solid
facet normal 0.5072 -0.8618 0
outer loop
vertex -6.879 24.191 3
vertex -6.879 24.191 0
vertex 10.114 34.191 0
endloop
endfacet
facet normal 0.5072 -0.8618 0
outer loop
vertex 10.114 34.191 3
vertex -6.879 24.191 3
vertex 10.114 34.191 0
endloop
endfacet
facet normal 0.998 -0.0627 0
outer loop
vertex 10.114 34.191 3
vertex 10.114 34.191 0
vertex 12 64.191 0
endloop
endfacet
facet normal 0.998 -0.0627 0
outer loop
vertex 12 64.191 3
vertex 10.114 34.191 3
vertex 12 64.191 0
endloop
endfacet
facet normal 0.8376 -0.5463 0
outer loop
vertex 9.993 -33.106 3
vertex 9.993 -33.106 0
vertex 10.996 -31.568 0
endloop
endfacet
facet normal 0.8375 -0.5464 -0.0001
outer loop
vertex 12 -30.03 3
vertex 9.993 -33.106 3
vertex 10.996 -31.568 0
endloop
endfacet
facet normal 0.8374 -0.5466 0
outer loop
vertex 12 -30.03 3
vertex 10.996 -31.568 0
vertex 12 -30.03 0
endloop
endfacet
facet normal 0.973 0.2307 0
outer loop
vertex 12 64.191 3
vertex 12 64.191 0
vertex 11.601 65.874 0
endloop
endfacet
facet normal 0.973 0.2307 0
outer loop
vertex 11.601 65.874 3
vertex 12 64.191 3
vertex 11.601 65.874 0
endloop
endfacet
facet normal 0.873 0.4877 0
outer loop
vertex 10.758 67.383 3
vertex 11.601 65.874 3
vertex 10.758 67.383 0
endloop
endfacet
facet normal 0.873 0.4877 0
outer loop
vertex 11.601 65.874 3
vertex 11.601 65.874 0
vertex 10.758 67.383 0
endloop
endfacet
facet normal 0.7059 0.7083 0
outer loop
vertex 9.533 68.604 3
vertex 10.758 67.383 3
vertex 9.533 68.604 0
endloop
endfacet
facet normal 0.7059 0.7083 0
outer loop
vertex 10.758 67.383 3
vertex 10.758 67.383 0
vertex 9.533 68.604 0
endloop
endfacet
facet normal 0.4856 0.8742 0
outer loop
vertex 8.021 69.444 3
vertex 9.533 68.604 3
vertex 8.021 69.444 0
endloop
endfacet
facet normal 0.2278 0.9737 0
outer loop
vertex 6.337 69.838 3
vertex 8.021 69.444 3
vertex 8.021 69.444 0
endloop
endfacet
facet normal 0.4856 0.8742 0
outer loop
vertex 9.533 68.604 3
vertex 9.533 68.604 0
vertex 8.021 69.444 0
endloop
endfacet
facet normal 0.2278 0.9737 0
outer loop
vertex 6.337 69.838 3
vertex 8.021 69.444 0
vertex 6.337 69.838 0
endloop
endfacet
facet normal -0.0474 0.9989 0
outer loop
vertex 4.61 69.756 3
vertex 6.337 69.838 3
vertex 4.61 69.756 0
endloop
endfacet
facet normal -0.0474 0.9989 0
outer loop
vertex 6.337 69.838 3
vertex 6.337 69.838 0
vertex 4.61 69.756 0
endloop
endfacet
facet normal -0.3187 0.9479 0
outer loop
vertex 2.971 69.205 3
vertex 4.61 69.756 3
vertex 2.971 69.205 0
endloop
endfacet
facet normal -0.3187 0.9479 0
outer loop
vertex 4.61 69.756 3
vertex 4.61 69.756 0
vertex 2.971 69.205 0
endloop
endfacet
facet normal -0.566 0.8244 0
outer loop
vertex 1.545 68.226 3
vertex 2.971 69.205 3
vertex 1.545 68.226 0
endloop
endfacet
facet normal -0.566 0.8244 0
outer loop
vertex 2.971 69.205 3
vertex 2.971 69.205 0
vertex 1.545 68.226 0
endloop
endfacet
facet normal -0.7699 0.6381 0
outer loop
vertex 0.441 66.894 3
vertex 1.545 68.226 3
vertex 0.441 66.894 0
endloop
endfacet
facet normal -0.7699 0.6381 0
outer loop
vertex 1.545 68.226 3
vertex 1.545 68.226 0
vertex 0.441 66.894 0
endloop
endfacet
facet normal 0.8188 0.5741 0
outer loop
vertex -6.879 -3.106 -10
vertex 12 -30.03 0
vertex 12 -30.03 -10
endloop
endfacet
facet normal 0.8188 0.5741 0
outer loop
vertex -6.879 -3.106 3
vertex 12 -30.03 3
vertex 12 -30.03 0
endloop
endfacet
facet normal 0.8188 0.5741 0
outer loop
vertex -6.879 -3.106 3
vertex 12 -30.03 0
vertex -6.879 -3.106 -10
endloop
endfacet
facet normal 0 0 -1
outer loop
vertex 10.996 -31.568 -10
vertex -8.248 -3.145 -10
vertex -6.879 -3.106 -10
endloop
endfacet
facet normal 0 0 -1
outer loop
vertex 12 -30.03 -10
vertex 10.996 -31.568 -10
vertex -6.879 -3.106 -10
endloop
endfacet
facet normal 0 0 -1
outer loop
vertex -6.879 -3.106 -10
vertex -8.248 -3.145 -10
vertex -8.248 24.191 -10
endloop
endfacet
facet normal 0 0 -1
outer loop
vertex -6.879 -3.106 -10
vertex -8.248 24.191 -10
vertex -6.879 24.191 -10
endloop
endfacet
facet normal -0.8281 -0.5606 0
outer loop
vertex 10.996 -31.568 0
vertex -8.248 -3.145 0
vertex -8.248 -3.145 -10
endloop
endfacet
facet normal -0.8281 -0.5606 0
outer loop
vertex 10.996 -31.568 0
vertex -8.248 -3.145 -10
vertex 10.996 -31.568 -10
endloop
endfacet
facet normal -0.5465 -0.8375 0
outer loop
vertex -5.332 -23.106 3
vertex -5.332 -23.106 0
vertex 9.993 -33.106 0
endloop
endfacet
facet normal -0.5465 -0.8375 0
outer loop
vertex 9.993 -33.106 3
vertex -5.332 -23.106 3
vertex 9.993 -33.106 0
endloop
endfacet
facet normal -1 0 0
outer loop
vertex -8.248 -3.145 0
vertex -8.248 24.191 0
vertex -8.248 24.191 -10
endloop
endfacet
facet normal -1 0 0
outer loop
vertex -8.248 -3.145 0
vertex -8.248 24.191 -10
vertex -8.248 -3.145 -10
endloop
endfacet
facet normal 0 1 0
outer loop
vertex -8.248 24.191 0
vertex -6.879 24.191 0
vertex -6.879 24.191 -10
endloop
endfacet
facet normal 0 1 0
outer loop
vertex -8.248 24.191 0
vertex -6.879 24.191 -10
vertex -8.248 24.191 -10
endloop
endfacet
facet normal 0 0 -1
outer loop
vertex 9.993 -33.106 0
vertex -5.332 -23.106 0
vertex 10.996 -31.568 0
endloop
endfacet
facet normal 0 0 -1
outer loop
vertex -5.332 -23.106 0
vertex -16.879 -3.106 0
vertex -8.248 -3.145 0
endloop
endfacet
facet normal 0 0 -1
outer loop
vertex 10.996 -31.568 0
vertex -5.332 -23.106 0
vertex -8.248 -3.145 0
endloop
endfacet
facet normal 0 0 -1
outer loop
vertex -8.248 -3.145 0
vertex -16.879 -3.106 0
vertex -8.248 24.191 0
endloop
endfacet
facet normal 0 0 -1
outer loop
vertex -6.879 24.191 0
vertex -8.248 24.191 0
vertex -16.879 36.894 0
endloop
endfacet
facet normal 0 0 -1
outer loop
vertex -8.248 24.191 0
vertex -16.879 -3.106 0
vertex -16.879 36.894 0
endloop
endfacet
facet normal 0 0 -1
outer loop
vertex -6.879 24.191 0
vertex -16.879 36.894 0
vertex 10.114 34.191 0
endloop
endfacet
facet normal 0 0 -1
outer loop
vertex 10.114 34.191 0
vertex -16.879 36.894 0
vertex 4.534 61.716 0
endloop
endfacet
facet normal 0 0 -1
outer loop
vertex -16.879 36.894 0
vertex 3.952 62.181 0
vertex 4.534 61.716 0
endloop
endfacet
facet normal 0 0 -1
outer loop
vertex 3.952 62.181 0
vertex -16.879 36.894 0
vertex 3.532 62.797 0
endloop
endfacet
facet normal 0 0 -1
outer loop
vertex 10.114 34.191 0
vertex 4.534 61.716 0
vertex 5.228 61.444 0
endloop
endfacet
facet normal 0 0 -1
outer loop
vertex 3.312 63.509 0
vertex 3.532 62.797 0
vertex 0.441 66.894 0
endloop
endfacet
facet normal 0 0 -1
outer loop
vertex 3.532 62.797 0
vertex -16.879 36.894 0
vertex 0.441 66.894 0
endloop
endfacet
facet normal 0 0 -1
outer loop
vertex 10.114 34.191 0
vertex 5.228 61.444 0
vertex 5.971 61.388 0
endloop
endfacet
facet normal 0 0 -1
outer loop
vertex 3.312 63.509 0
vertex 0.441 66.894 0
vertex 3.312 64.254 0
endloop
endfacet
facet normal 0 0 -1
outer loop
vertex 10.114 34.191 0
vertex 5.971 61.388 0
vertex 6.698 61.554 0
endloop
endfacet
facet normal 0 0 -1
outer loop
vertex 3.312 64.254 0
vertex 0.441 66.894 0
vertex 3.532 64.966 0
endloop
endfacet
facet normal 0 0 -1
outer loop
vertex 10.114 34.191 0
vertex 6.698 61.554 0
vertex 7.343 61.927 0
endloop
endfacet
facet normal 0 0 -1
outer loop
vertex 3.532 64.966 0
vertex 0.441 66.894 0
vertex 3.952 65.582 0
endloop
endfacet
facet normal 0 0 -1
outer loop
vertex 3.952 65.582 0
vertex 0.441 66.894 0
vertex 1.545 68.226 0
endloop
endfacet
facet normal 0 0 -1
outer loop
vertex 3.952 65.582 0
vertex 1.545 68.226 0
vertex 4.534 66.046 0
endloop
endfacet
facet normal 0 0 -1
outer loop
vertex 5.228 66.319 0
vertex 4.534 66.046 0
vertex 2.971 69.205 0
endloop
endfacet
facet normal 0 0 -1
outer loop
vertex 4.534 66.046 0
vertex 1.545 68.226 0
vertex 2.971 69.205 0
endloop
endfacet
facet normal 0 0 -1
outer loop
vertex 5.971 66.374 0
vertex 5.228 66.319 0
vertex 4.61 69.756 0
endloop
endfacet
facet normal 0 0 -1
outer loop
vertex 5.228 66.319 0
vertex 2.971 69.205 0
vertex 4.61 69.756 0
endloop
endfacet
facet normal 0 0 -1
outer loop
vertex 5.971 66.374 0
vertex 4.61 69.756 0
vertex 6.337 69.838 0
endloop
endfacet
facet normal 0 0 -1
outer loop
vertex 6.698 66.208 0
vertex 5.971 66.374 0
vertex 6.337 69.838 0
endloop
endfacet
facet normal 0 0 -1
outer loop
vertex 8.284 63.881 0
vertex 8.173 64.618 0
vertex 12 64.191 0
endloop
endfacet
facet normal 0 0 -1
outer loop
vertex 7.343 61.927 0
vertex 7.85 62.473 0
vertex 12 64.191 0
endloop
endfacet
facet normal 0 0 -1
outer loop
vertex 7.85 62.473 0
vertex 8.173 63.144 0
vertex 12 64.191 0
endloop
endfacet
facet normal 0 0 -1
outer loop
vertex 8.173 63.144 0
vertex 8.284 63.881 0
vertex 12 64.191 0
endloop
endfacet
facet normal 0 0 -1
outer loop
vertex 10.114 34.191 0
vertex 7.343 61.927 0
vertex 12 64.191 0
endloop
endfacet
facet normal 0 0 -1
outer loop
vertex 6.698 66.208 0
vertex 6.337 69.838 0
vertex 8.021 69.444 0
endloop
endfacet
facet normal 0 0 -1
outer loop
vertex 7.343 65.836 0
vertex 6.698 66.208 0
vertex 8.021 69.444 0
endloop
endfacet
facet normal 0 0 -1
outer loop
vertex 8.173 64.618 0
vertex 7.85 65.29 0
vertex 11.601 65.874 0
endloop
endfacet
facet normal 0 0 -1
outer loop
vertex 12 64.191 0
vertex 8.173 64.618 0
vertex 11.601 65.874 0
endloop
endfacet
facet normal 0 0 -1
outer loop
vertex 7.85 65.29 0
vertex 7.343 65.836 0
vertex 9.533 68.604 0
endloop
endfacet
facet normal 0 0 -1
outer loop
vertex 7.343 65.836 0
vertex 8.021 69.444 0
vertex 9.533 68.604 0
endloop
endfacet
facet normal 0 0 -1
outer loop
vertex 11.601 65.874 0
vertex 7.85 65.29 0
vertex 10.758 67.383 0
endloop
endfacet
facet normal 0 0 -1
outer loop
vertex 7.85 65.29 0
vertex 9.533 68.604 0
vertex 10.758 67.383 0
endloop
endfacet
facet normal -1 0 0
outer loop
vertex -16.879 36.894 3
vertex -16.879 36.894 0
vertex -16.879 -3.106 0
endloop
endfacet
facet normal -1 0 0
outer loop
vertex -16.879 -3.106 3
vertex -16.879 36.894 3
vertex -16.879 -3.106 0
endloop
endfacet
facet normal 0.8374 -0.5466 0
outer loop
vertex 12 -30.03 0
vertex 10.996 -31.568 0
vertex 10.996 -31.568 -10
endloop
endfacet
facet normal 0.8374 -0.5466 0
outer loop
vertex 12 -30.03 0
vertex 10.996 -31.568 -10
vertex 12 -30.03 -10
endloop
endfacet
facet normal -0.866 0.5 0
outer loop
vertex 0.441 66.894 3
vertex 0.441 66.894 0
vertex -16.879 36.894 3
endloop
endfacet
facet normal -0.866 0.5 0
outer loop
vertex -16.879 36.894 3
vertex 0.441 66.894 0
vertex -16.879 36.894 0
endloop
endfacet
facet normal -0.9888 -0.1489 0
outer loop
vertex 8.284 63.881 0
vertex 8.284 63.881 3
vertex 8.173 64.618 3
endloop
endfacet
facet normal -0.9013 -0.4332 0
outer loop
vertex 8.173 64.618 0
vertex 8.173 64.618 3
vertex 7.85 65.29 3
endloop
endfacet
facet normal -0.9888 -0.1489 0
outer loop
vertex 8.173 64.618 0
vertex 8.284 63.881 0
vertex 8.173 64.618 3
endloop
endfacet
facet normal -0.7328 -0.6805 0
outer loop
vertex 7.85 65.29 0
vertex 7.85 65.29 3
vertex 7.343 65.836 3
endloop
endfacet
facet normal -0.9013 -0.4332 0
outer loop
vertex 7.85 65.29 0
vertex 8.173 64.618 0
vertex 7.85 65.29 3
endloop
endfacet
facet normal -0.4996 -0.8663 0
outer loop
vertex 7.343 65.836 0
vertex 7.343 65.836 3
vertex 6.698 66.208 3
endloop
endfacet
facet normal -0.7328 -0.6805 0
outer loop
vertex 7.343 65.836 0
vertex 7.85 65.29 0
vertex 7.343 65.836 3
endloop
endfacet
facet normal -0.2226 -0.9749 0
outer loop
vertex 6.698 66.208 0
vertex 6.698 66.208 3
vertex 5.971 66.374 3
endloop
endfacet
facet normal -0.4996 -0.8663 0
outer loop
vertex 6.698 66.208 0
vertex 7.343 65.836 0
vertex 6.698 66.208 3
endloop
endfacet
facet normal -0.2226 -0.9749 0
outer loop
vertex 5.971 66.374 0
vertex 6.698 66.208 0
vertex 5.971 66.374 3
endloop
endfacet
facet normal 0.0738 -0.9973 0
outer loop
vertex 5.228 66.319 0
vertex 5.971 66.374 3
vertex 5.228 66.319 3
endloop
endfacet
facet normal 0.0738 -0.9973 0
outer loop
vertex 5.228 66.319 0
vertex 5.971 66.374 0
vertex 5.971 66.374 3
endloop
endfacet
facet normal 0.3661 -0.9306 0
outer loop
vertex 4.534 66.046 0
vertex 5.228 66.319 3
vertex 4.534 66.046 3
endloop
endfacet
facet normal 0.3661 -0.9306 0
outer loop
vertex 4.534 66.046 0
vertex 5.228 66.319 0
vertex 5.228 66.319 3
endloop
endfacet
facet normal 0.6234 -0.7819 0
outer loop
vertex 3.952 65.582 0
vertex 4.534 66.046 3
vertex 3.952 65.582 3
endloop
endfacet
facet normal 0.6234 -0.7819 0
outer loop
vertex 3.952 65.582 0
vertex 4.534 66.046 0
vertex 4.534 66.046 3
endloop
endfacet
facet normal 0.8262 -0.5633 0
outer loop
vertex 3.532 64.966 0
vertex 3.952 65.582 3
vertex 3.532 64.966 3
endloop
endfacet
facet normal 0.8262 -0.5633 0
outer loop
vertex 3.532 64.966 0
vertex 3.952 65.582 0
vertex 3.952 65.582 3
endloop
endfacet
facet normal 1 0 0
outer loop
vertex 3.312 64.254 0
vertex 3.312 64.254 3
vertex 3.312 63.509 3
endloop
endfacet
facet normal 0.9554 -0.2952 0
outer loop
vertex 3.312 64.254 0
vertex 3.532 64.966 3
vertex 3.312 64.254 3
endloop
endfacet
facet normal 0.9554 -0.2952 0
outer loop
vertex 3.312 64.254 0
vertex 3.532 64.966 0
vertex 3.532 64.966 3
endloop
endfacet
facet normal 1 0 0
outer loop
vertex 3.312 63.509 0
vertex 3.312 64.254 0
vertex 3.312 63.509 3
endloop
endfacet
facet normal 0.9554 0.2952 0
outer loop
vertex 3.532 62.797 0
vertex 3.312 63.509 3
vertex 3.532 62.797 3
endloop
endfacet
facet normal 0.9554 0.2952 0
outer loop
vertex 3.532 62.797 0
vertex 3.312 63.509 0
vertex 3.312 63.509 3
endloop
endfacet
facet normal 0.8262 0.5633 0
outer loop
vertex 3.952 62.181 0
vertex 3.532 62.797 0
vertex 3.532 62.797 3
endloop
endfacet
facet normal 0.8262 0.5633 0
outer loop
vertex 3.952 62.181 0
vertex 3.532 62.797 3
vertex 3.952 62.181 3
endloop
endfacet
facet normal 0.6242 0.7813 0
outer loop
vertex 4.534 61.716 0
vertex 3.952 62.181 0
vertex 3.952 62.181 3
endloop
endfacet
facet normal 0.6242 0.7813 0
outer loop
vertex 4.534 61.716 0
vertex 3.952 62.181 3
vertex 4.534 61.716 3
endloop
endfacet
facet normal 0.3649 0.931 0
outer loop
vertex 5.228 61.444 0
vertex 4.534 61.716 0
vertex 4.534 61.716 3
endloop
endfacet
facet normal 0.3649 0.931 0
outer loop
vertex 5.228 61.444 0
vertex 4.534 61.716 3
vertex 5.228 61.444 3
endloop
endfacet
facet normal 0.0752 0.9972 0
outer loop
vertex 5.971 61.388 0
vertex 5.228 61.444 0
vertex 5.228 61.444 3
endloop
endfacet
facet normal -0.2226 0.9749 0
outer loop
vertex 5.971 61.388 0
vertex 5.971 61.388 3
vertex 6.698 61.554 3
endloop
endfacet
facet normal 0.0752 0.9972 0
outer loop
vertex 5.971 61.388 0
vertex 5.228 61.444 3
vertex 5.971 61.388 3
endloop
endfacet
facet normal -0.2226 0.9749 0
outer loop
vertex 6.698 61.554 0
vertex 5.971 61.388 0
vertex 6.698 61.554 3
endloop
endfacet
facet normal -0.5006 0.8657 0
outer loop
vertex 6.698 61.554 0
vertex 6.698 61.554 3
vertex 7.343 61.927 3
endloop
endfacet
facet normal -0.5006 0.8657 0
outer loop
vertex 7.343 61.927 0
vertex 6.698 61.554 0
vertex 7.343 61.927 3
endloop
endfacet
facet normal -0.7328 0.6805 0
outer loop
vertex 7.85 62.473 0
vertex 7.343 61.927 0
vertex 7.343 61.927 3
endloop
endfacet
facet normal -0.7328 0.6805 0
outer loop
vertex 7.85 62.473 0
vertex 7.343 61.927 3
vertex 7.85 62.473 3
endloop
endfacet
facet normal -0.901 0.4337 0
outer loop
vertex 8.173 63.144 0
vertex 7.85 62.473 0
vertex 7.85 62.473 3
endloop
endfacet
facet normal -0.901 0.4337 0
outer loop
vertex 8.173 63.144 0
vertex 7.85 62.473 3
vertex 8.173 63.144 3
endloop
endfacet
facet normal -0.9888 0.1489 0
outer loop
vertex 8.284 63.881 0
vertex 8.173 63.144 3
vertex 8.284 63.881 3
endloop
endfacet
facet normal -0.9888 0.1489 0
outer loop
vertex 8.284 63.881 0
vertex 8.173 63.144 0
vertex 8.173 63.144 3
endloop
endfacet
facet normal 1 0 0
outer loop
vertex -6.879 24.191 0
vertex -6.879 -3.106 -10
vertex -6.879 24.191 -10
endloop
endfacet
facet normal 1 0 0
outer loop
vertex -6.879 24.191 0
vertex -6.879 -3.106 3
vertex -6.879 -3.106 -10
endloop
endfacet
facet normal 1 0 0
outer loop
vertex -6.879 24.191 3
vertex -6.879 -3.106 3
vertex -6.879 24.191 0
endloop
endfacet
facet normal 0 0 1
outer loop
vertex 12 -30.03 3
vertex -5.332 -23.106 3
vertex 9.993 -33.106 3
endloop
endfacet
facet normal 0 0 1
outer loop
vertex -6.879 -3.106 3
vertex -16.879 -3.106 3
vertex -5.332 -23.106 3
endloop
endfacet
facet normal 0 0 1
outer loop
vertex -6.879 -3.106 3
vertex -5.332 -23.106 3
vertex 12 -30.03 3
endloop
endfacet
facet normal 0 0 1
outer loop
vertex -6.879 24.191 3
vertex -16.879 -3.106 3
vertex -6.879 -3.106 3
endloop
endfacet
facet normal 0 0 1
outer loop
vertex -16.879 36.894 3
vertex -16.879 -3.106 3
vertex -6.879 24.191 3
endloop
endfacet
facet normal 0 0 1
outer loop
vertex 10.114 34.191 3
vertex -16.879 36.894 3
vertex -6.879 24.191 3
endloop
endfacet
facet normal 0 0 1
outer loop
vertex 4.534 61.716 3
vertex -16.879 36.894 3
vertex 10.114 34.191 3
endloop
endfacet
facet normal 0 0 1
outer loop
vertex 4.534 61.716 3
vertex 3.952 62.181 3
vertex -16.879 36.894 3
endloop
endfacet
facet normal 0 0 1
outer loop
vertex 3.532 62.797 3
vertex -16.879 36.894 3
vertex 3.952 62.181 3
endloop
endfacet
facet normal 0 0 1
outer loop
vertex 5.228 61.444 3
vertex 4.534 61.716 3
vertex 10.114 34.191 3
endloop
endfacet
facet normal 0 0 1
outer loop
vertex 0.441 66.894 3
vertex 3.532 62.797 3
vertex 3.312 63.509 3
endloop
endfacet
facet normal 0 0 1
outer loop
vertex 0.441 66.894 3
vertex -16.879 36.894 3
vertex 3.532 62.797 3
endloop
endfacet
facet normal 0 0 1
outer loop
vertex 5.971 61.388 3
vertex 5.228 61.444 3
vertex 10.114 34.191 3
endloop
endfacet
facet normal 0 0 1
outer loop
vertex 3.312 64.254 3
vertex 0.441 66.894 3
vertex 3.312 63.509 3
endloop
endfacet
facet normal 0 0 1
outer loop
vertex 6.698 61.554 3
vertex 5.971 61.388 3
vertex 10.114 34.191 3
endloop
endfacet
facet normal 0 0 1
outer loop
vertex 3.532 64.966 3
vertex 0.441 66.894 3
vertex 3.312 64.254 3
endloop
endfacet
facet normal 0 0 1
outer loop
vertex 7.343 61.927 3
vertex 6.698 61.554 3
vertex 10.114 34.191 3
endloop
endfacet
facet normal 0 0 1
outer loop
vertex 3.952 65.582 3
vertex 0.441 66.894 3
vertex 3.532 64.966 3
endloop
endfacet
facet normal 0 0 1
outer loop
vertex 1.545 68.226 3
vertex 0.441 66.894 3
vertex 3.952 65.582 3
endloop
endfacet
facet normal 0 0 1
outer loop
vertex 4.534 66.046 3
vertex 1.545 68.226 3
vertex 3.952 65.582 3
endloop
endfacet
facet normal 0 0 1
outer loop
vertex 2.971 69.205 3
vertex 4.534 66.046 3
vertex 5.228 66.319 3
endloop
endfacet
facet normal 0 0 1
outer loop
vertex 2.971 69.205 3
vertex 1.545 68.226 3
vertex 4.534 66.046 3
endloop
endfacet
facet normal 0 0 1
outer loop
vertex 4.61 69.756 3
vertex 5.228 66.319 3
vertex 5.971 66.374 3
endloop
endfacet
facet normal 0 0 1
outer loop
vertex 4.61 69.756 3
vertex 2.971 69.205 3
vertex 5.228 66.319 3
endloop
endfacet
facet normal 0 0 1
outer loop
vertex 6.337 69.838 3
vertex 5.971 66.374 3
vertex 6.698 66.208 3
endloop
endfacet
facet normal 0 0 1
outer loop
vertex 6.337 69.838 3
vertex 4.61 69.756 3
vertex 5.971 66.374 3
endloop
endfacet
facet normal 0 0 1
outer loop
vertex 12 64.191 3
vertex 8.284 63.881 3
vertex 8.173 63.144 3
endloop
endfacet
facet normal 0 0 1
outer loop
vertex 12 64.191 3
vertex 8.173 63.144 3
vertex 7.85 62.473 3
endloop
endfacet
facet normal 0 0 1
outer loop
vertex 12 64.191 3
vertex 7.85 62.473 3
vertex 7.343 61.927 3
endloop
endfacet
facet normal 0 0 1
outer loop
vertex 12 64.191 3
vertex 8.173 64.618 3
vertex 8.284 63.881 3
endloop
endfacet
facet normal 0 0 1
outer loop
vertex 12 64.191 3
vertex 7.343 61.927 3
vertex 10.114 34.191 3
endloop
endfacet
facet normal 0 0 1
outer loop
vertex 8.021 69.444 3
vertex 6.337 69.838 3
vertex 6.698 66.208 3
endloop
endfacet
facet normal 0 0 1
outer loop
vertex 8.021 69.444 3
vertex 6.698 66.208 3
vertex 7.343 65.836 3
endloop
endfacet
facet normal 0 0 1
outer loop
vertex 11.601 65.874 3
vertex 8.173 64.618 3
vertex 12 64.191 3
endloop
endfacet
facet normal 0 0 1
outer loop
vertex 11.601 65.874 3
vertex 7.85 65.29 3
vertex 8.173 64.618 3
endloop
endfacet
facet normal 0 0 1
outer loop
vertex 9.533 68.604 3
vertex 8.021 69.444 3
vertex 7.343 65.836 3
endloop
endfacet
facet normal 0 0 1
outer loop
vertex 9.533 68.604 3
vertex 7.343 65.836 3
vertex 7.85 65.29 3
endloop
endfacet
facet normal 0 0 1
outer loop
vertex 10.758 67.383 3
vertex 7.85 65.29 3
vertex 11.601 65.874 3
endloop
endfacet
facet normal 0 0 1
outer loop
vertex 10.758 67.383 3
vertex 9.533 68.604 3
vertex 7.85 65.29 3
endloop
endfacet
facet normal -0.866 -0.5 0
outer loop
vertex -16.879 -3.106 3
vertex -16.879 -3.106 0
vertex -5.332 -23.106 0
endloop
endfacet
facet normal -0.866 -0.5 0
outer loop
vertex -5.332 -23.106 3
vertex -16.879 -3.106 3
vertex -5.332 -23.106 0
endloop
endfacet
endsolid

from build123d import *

# Parameters (mm, degrees)
EXTRUDE_4_DEPTH     = 3
SKETCH_2_R          = 2.5
CUT_EXTRUDE_1_DEPTH = 72.936469634
EXTRUDE_6_DEPTH     = 10


with BuildPart() as part:
    # 草图1 → 凸台-拉伸4 (new body)
    with BuildSketch(Plane.XY):
        with BuildLine():
            ThreePointArc((11.999755772, 64.190702015), (7.19287537, 69.699227744), (0.441332655, 66.894477154))
            Line((0.441332655, 66.894477154), (-16.87917542, 36.894477154))
            Line((-16.87917542, 36.894477154), (-16.87917542, -3.105522846))
            Line((-16.87917542, -3.105522846), (-5.332170037, -23.105522846))
            Line((-5.332170037, -23.105522846), (9.992741519, -33.105522846))
            Line((9.992741519, -33.105522846), (11.999755772, -30.029791253))
            Line((11.999755772, -30.029791253), (-6.87917542, -3.105522846))
            Line((-6.87917542, -3.105522846), (-6.87917542, 14.190702015))
            Line((-6.87917542, 14.190702015), (-6.87917542, 24.190702015))
            Line((-6.87917542, 24.190702015), (10.114332844, 34.190702015))
            Line((10.114332844, 34.190702015), (11.999755772, 64.190702015))
        make_face()
    extrude(amount=EXTRUDE_4_DEPTH)

    # 草图2 → 切除-拉伸1 (cut, through all)
    with BuildSketch(Plane.XY):
        with Locations((5.784422652, 63.881230161)):
            Circle(SKETCH_2_R)
    extrude(amount=CUT_EXTRUDE_1_DEPTH, mode=Mode.SUBTRACT)

    # 草图6 → 凸台-拉伸6 (add)
    with BuildSketch(Plane(origin=(0, 0, 0), x_dir=(-1, 0, 0), z_dir=(0, 0, -1))):
        Polygon((6.87917542, 24.190702015), (8.248400541, 24.190702015), (8.248400541, -3.145484966), (-10.996248645, -31.567657049), (-11.999755772, -30.029791253), (6.87917542, -3.105522846), align=None)
    extrude(amount=EXTRUDE_6_DEPTH)


solid = part.part
